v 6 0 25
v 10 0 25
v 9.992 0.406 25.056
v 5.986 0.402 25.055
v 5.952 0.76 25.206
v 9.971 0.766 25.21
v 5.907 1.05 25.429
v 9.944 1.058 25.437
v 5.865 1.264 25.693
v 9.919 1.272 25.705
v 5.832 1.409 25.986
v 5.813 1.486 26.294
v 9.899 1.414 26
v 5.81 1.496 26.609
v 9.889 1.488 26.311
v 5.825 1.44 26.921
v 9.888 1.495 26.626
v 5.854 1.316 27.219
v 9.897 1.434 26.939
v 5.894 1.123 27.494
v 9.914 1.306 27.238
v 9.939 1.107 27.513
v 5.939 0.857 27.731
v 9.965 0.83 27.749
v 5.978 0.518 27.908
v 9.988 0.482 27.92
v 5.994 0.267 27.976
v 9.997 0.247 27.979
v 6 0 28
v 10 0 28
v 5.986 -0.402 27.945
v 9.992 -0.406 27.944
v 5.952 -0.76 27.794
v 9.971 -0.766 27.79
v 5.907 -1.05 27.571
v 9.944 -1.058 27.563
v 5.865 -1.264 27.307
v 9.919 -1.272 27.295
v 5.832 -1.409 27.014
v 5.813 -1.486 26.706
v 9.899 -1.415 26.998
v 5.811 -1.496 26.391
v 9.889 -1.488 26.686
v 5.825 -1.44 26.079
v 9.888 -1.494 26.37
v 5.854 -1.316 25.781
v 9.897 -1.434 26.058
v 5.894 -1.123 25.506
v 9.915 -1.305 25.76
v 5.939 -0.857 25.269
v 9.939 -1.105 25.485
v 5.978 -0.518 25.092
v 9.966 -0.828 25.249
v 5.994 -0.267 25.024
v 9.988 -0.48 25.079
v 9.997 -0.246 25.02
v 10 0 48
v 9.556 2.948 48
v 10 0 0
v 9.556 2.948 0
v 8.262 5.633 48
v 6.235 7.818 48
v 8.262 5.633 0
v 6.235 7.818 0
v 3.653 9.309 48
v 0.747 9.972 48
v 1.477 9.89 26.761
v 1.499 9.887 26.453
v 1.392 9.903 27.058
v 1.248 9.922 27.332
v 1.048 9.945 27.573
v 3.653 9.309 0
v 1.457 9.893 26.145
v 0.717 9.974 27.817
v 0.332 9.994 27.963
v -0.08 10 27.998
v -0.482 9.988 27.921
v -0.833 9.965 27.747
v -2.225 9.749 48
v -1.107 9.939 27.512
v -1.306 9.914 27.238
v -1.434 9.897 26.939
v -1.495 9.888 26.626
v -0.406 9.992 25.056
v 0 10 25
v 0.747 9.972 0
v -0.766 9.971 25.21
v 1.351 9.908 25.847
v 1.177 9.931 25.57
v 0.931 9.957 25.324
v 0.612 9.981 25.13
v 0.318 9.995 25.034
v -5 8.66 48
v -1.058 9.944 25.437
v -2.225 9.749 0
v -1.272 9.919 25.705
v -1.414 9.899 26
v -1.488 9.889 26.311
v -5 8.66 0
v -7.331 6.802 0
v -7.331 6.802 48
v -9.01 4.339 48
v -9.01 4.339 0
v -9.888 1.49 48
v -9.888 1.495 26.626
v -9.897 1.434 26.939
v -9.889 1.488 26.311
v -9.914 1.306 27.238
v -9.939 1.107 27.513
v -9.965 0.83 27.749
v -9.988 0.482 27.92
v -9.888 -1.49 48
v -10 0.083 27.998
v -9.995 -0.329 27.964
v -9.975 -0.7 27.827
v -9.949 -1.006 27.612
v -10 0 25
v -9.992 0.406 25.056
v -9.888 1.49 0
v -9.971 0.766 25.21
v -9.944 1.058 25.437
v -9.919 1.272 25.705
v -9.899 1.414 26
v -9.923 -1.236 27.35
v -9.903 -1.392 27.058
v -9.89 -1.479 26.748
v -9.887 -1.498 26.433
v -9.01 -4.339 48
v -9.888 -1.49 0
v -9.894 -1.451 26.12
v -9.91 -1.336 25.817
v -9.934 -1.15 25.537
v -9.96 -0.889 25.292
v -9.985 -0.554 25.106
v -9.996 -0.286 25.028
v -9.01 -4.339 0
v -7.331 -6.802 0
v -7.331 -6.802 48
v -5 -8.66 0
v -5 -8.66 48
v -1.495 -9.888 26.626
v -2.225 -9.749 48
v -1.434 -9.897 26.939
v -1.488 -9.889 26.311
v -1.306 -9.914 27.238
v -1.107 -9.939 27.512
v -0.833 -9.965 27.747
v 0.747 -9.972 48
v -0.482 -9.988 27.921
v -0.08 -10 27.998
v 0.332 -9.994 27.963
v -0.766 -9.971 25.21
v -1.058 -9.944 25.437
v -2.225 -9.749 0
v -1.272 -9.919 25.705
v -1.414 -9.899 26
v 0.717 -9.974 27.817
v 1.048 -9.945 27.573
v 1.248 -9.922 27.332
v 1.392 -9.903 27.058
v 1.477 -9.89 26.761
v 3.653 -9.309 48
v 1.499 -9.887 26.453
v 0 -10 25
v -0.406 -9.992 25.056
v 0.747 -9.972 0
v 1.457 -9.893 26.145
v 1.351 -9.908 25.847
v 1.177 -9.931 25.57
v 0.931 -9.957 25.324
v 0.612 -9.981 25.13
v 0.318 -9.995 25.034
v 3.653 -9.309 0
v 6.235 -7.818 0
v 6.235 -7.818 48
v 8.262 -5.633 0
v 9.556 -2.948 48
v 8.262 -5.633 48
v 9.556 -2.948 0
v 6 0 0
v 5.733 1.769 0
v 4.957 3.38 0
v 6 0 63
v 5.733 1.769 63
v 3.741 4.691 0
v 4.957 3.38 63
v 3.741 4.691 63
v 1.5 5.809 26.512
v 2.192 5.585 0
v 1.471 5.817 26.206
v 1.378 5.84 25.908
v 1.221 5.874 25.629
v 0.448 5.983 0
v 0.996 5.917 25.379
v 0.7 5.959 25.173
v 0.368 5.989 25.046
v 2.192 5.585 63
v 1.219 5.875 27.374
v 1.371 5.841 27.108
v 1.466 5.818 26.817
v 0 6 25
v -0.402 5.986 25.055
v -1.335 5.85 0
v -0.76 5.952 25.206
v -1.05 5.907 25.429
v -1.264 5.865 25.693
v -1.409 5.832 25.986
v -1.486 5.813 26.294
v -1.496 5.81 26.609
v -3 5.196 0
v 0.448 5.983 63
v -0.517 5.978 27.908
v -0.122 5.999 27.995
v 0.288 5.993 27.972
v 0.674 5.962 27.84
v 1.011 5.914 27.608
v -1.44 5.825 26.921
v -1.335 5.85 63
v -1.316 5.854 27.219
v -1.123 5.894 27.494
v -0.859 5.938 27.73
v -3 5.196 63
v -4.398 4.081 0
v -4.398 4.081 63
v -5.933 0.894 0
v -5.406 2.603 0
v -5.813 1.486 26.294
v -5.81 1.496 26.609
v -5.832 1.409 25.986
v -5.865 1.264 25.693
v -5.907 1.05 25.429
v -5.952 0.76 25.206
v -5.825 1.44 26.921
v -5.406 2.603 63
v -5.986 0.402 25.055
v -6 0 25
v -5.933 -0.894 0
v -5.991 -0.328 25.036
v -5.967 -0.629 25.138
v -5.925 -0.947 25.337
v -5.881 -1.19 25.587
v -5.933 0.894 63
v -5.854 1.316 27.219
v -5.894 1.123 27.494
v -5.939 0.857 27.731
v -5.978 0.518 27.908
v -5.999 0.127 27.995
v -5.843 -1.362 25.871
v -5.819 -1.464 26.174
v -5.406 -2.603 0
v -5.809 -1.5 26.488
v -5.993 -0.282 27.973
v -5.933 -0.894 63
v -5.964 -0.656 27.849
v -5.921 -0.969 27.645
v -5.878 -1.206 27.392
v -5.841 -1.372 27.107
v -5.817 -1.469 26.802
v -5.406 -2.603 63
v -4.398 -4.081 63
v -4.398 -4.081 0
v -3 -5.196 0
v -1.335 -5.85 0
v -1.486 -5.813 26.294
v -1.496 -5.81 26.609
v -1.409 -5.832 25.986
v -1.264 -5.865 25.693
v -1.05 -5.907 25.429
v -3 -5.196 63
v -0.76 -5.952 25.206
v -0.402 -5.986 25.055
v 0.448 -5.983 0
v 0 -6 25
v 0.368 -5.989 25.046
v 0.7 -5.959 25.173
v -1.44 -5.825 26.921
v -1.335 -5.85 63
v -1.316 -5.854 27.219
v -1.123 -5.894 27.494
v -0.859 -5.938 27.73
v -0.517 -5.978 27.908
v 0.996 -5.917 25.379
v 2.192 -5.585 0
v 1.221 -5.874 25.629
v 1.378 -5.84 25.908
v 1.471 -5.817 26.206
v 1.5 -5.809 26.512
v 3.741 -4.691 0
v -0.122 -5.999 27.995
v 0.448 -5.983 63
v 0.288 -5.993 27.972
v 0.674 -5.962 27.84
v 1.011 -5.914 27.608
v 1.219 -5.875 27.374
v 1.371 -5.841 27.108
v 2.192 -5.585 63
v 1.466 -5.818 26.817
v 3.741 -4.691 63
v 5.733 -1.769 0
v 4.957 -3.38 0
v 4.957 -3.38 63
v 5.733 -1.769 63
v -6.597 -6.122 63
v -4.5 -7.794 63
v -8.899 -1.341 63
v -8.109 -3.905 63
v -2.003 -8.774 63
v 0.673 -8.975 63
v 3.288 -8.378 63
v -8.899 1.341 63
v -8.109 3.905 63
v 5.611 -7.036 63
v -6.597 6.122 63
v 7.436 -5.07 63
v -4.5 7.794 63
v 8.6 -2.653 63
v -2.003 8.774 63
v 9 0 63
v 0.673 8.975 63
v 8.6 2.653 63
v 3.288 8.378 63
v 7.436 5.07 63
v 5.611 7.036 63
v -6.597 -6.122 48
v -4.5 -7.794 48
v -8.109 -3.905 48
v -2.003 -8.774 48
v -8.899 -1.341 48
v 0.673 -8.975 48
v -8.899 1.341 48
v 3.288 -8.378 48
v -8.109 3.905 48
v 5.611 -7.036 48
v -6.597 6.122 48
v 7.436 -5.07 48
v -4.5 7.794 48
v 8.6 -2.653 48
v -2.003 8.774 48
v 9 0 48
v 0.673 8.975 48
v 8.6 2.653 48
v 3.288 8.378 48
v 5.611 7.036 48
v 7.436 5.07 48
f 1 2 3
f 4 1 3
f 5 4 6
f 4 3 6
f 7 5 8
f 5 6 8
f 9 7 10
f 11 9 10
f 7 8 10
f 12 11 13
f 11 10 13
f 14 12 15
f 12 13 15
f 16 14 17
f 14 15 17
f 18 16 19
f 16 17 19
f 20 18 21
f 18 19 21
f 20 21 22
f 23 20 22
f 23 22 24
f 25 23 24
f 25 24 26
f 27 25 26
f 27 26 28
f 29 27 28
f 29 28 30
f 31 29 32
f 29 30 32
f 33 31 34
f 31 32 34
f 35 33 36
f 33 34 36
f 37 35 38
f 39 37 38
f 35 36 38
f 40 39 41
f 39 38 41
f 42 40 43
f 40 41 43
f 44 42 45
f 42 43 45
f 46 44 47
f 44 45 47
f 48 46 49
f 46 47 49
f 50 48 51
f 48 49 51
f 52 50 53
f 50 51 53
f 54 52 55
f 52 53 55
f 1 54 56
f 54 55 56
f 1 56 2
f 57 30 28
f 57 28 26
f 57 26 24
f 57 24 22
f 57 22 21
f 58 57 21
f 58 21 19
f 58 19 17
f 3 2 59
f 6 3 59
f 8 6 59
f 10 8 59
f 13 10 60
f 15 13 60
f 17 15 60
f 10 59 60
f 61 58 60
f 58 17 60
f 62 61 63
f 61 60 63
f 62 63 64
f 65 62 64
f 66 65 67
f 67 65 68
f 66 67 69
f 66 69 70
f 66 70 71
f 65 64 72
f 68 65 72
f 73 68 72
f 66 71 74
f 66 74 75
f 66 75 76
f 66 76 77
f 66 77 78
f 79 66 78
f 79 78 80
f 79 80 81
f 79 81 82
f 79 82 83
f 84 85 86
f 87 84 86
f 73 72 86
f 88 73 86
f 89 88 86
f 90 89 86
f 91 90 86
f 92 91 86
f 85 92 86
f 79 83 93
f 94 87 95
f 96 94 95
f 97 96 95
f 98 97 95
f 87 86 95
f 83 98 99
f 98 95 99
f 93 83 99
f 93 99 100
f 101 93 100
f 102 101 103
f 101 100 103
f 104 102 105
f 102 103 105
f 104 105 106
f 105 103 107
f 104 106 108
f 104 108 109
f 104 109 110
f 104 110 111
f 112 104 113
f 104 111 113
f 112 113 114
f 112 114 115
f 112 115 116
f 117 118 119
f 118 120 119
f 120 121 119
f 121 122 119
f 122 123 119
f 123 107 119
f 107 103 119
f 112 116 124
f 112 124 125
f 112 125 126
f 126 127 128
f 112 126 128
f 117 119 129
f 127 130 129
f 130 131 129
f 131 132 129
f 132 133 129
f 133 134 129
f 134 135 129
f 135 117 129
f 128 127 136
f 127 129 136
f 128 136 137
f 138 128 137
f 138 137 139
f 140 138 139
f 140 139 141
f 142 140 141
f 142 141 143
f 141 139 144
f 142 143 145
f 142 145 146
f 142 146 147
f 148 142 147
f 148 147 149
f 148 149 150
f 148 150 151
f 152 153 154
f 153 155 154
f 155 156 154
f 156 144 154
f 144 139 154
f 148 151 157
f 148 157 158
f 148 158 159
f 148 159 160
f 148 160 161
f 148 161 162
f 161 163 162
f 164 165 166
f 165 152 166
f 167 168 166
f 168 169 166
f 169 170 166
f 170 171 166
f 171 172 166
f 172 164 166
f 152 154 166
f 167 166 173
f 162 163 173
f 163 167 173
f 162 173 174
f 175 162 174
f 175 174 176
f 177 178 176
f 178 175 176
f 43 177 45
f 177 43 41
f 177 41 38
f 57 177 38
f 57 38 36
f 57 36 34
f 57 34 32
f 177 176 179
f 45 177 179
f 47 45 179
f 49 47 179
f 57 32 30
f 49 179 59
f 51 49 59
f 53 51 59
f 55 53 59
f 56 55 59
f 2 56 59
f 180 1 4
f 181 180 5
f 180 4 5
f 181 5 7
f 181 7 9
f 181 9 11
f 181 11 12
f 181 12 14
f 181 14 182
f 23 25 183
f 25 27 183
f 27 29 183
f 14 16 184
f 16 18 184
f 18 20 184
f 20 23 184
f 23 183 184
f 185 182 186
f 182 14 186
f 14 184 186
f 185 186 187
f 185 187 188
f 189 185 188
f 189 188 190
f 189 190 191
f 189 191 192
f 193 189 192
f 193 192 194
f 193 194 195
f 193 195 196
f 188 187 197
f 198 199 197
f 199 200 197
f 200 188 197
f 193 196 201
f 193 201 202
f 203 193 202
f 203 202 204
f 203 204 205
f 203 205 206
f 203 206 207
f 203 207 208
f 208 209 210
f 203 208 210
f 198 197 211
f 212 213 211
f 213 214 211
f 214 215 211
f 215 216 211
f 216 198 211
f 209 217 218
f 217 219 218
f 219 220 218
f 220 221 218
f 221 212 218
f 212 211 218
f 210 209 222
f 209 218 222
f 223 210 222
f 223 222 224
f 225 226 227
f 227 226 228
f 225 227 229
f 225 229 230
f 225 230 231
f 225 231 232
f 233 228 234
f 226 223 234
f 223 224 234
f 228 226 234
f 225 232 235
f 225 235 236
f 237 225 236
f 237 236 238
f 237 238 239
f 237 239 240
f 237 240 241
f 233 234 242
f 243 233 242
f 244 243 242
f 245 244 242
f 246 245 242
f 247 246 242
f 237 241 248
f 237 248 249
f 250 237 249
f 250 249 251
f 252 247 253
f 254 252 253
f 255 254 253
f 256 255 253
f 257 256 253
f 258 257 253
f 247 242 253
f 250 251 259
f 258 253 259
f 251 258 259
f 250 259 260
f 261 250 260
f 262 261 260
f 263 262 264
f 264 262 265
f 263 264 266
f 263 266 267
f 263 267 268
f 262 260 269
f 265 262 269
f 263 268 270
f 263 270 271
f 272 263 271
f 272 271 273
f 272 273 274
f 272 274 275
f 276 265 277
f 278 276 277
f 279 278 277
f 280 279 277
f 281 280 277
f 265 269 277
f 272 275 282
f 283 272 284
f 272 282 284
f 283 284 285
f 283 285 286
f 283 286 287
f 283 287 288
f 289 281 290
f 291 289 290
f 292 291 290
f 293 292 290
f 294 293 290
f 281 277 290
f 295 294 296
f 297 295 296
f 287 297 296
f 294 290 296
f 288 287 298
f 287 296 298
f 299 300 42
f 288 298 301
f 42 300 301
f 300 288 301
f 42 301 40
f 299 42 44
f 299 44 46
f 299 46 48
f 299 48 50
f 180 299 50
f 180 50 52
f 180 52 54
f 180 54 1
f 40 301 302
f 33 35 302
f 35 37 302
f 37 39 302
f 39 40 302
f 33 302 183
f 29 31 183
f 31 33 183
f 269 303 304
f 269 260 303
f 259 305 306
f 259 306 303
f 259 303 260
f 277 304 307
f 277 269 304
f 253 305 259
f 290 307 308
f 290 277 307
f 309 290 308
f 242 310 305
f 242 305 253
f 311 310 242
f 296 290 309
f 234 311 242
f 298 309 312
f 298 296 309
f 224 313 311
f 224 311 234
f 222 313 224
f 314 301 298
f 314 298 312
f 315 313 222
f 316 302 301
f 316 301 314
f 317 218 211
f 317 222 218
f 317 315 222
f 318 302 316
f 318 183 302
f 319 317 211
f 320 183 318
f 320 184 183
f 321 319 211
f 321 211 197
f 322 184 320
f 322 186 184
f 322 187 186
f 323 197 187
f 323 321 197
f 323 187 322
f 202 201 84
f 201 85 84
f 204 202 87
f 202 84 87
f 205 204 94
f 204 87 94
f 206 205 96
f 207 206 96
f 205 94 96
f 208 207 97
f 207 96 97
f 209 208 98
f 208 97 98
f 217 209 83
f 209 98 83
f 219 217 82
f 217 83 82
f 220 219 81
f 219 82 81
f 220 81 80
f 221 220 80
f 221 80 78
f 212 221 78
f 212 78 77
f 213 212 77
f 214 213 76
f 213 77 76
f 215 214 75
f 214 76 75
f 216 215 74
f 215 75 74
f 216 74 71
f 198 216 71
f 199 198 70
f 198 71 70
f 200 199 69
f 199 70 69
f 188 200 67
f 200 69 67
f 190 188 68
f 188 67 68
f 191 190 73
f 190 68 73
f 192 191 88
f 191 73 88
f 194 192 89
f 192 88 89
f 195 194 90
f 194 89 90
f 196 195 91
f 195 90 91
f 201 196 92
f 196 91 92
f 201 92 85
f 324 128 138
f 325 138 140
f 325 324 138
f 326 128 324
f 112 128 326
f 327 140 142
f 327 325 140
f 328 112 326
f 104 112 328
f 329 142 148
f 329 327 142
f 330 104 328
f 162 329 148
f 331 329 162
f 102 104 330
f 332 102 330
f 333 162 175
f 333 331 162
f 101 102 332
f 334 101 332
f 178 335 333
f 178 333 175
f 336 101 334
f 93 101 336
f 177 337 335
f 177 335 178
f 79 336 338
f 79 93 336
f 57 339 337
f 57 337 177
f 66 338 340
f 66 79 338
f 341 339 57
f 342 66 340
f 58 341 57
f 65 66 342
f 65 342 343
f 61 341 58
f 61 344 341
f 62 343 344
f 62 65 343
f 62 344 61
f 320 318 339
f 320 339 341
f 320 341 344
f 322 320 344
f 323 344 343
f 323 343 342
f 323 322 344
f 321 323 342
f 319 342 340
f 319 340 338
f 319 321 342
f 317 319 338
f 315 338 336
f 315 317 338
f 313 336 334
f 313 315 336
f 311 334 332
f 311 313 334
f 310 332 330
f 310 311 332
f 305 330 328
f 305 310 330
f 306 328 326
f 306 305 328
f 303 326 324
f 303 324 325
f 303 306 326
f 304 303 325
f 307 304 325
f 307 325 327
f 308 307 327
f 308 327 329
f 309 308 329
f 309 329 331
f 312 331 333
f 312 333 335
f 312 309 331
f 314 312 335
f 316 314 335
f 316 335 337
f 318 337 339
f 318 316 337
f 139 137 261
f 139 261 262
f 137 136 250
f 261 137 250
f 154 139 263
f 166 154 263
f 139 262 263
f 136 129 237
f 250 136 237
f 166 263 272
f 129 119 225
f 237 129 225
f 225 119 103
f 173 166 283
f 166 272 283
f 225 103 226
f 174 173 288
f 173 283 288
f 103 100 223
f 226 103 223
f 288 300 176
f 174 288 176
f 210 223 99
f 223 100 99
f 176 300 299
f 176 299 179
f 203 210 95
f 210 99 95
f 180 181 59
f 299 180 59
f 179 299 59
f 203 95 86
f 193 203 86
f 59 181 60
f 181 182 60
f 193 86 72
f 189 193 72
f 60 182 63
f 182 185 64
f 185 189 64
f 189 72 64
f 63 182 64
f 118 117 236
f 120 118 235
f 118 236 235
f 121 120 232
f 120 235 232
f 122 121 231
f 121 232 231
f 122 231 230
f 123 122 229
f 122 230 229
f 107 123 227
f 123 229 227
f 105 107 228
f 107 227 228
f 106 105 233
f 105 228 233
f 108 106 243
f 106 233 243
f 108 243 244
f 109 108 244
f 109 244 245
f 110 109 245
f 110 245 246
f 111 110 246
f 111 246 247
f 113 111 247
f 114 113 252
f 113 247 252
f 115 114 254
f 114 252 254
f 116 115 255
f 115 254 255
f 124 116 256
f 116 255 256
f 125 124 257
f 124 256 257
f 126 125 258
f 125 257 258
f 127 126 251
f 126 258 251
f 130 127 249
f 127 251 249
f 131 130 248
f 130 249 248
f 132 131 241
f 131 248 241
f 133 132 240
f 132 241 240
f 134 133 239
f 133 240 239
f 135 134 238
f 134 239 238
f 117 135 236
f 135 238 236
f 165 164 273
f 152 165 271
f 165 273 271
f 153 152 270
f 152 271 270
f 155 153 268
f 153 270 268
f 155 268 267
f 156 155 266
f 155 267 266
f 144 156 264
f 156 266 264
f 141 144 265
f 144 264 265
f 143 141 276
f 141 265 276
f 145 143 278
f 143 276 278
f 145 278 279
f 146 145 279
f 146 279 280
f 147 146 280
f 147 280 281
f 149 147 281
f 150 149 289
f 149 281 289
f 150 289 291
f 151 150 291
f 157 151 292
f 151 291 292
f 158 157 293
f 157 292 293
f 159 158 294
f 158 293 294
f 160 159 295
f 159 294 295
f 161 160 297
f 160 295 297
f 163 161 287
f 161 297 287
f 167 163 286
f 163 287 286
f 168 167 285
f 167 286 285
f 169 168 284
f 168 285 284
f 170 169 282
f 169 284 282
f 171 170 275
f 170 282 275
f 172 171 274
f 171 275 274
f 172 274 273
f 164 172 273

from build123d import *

# Parameters (mm, degrees)
SKETCH_1_R               = 10
EXTRUDE_1_DEPTH          = 63
SKETCH_2_OUTSIDE_W       = 35.812
SKETCH_2_OUTSIDE_H       = 35.812
SKETCH_2_OUTSIDE_R       = 9
CUT_EXTRUDE_1_DEPTH      = 15
SKETCH_3_R               = 6
CUT_EXTRUDE_2_DEPTH      = 65.567793829
SKETCH_4_R               = 1.5
CUT_EXTRUDE_3_DEPTH      = 65.567793829
PATTERN_CIRCULAR_1_COUNT = 2
PATTERN_CIRCULAR_1_ANGLE = 90


with BuildPart() as part:
    # 草图1 → 凸台-拉伸1 (new body)
    with BuildSketch(Plane.XY):
        Circle(SKETCH_1_R)
    extrude(amount=EXTRUDE_1_DEPTH)

    # 草图2 outside → 切除-拉伸1 (cut)
    with BuildSketch(Plane.XY.offset(63)):
        Rectangle(SKETCH_2_OUTSIDE_W, SKETCH_2_OUTSIDE_H)
        Circle(SKETCH_2_OUTSIDE_R, mode=Mode.SUBTRACT)
    extrude(amount=-CUT_EXTRUDE_1_DEPTH, mode=Mode.SUBTRACT)

    # 草图3 → 切除-拉伸2 (cut, through all)
    with BuildSketch(Plane.XY.offset(63)):
        Circle(SKETCH_3_R)
    extrude(amount=-CUT_EXTRUDE_2_DEPTH, mode=Mode.SUBTRACT)

    # 草图4 → 切除-拉伸3 (cut, symmetric)
    with BuildSketch(Plane(origin=(0, 0, 0), x_dir=(0, 0, -1), z_dir=(1, 0, 0))):
        with Locations((-26.5, 0)):
            Circle(SKETCH_4_R)
    cut_extrude_3 = extrude(amount=CUT_EXTRUDE_3_DEPTH, both=True, mode=Mode.SUBTRACT)

    # 阵列(圆周)1: 切除-拉伸3 ×2 about axis
    pattern_circular_1_axis = Axis((0, 0, 63), (0, 0, 1))
    for i in range(1, PATTERN_CIRCULAR_1_COUNT):
        add(cut_extrude_3.rotate(pattern_circular_1_axis, i * PATTERN_CIRCULAR_1_ANGLE / (PATTERN_CIRCULAR_1_COUNT - 1)), mode=Mode.SUBTRACT)


solid = part.part
